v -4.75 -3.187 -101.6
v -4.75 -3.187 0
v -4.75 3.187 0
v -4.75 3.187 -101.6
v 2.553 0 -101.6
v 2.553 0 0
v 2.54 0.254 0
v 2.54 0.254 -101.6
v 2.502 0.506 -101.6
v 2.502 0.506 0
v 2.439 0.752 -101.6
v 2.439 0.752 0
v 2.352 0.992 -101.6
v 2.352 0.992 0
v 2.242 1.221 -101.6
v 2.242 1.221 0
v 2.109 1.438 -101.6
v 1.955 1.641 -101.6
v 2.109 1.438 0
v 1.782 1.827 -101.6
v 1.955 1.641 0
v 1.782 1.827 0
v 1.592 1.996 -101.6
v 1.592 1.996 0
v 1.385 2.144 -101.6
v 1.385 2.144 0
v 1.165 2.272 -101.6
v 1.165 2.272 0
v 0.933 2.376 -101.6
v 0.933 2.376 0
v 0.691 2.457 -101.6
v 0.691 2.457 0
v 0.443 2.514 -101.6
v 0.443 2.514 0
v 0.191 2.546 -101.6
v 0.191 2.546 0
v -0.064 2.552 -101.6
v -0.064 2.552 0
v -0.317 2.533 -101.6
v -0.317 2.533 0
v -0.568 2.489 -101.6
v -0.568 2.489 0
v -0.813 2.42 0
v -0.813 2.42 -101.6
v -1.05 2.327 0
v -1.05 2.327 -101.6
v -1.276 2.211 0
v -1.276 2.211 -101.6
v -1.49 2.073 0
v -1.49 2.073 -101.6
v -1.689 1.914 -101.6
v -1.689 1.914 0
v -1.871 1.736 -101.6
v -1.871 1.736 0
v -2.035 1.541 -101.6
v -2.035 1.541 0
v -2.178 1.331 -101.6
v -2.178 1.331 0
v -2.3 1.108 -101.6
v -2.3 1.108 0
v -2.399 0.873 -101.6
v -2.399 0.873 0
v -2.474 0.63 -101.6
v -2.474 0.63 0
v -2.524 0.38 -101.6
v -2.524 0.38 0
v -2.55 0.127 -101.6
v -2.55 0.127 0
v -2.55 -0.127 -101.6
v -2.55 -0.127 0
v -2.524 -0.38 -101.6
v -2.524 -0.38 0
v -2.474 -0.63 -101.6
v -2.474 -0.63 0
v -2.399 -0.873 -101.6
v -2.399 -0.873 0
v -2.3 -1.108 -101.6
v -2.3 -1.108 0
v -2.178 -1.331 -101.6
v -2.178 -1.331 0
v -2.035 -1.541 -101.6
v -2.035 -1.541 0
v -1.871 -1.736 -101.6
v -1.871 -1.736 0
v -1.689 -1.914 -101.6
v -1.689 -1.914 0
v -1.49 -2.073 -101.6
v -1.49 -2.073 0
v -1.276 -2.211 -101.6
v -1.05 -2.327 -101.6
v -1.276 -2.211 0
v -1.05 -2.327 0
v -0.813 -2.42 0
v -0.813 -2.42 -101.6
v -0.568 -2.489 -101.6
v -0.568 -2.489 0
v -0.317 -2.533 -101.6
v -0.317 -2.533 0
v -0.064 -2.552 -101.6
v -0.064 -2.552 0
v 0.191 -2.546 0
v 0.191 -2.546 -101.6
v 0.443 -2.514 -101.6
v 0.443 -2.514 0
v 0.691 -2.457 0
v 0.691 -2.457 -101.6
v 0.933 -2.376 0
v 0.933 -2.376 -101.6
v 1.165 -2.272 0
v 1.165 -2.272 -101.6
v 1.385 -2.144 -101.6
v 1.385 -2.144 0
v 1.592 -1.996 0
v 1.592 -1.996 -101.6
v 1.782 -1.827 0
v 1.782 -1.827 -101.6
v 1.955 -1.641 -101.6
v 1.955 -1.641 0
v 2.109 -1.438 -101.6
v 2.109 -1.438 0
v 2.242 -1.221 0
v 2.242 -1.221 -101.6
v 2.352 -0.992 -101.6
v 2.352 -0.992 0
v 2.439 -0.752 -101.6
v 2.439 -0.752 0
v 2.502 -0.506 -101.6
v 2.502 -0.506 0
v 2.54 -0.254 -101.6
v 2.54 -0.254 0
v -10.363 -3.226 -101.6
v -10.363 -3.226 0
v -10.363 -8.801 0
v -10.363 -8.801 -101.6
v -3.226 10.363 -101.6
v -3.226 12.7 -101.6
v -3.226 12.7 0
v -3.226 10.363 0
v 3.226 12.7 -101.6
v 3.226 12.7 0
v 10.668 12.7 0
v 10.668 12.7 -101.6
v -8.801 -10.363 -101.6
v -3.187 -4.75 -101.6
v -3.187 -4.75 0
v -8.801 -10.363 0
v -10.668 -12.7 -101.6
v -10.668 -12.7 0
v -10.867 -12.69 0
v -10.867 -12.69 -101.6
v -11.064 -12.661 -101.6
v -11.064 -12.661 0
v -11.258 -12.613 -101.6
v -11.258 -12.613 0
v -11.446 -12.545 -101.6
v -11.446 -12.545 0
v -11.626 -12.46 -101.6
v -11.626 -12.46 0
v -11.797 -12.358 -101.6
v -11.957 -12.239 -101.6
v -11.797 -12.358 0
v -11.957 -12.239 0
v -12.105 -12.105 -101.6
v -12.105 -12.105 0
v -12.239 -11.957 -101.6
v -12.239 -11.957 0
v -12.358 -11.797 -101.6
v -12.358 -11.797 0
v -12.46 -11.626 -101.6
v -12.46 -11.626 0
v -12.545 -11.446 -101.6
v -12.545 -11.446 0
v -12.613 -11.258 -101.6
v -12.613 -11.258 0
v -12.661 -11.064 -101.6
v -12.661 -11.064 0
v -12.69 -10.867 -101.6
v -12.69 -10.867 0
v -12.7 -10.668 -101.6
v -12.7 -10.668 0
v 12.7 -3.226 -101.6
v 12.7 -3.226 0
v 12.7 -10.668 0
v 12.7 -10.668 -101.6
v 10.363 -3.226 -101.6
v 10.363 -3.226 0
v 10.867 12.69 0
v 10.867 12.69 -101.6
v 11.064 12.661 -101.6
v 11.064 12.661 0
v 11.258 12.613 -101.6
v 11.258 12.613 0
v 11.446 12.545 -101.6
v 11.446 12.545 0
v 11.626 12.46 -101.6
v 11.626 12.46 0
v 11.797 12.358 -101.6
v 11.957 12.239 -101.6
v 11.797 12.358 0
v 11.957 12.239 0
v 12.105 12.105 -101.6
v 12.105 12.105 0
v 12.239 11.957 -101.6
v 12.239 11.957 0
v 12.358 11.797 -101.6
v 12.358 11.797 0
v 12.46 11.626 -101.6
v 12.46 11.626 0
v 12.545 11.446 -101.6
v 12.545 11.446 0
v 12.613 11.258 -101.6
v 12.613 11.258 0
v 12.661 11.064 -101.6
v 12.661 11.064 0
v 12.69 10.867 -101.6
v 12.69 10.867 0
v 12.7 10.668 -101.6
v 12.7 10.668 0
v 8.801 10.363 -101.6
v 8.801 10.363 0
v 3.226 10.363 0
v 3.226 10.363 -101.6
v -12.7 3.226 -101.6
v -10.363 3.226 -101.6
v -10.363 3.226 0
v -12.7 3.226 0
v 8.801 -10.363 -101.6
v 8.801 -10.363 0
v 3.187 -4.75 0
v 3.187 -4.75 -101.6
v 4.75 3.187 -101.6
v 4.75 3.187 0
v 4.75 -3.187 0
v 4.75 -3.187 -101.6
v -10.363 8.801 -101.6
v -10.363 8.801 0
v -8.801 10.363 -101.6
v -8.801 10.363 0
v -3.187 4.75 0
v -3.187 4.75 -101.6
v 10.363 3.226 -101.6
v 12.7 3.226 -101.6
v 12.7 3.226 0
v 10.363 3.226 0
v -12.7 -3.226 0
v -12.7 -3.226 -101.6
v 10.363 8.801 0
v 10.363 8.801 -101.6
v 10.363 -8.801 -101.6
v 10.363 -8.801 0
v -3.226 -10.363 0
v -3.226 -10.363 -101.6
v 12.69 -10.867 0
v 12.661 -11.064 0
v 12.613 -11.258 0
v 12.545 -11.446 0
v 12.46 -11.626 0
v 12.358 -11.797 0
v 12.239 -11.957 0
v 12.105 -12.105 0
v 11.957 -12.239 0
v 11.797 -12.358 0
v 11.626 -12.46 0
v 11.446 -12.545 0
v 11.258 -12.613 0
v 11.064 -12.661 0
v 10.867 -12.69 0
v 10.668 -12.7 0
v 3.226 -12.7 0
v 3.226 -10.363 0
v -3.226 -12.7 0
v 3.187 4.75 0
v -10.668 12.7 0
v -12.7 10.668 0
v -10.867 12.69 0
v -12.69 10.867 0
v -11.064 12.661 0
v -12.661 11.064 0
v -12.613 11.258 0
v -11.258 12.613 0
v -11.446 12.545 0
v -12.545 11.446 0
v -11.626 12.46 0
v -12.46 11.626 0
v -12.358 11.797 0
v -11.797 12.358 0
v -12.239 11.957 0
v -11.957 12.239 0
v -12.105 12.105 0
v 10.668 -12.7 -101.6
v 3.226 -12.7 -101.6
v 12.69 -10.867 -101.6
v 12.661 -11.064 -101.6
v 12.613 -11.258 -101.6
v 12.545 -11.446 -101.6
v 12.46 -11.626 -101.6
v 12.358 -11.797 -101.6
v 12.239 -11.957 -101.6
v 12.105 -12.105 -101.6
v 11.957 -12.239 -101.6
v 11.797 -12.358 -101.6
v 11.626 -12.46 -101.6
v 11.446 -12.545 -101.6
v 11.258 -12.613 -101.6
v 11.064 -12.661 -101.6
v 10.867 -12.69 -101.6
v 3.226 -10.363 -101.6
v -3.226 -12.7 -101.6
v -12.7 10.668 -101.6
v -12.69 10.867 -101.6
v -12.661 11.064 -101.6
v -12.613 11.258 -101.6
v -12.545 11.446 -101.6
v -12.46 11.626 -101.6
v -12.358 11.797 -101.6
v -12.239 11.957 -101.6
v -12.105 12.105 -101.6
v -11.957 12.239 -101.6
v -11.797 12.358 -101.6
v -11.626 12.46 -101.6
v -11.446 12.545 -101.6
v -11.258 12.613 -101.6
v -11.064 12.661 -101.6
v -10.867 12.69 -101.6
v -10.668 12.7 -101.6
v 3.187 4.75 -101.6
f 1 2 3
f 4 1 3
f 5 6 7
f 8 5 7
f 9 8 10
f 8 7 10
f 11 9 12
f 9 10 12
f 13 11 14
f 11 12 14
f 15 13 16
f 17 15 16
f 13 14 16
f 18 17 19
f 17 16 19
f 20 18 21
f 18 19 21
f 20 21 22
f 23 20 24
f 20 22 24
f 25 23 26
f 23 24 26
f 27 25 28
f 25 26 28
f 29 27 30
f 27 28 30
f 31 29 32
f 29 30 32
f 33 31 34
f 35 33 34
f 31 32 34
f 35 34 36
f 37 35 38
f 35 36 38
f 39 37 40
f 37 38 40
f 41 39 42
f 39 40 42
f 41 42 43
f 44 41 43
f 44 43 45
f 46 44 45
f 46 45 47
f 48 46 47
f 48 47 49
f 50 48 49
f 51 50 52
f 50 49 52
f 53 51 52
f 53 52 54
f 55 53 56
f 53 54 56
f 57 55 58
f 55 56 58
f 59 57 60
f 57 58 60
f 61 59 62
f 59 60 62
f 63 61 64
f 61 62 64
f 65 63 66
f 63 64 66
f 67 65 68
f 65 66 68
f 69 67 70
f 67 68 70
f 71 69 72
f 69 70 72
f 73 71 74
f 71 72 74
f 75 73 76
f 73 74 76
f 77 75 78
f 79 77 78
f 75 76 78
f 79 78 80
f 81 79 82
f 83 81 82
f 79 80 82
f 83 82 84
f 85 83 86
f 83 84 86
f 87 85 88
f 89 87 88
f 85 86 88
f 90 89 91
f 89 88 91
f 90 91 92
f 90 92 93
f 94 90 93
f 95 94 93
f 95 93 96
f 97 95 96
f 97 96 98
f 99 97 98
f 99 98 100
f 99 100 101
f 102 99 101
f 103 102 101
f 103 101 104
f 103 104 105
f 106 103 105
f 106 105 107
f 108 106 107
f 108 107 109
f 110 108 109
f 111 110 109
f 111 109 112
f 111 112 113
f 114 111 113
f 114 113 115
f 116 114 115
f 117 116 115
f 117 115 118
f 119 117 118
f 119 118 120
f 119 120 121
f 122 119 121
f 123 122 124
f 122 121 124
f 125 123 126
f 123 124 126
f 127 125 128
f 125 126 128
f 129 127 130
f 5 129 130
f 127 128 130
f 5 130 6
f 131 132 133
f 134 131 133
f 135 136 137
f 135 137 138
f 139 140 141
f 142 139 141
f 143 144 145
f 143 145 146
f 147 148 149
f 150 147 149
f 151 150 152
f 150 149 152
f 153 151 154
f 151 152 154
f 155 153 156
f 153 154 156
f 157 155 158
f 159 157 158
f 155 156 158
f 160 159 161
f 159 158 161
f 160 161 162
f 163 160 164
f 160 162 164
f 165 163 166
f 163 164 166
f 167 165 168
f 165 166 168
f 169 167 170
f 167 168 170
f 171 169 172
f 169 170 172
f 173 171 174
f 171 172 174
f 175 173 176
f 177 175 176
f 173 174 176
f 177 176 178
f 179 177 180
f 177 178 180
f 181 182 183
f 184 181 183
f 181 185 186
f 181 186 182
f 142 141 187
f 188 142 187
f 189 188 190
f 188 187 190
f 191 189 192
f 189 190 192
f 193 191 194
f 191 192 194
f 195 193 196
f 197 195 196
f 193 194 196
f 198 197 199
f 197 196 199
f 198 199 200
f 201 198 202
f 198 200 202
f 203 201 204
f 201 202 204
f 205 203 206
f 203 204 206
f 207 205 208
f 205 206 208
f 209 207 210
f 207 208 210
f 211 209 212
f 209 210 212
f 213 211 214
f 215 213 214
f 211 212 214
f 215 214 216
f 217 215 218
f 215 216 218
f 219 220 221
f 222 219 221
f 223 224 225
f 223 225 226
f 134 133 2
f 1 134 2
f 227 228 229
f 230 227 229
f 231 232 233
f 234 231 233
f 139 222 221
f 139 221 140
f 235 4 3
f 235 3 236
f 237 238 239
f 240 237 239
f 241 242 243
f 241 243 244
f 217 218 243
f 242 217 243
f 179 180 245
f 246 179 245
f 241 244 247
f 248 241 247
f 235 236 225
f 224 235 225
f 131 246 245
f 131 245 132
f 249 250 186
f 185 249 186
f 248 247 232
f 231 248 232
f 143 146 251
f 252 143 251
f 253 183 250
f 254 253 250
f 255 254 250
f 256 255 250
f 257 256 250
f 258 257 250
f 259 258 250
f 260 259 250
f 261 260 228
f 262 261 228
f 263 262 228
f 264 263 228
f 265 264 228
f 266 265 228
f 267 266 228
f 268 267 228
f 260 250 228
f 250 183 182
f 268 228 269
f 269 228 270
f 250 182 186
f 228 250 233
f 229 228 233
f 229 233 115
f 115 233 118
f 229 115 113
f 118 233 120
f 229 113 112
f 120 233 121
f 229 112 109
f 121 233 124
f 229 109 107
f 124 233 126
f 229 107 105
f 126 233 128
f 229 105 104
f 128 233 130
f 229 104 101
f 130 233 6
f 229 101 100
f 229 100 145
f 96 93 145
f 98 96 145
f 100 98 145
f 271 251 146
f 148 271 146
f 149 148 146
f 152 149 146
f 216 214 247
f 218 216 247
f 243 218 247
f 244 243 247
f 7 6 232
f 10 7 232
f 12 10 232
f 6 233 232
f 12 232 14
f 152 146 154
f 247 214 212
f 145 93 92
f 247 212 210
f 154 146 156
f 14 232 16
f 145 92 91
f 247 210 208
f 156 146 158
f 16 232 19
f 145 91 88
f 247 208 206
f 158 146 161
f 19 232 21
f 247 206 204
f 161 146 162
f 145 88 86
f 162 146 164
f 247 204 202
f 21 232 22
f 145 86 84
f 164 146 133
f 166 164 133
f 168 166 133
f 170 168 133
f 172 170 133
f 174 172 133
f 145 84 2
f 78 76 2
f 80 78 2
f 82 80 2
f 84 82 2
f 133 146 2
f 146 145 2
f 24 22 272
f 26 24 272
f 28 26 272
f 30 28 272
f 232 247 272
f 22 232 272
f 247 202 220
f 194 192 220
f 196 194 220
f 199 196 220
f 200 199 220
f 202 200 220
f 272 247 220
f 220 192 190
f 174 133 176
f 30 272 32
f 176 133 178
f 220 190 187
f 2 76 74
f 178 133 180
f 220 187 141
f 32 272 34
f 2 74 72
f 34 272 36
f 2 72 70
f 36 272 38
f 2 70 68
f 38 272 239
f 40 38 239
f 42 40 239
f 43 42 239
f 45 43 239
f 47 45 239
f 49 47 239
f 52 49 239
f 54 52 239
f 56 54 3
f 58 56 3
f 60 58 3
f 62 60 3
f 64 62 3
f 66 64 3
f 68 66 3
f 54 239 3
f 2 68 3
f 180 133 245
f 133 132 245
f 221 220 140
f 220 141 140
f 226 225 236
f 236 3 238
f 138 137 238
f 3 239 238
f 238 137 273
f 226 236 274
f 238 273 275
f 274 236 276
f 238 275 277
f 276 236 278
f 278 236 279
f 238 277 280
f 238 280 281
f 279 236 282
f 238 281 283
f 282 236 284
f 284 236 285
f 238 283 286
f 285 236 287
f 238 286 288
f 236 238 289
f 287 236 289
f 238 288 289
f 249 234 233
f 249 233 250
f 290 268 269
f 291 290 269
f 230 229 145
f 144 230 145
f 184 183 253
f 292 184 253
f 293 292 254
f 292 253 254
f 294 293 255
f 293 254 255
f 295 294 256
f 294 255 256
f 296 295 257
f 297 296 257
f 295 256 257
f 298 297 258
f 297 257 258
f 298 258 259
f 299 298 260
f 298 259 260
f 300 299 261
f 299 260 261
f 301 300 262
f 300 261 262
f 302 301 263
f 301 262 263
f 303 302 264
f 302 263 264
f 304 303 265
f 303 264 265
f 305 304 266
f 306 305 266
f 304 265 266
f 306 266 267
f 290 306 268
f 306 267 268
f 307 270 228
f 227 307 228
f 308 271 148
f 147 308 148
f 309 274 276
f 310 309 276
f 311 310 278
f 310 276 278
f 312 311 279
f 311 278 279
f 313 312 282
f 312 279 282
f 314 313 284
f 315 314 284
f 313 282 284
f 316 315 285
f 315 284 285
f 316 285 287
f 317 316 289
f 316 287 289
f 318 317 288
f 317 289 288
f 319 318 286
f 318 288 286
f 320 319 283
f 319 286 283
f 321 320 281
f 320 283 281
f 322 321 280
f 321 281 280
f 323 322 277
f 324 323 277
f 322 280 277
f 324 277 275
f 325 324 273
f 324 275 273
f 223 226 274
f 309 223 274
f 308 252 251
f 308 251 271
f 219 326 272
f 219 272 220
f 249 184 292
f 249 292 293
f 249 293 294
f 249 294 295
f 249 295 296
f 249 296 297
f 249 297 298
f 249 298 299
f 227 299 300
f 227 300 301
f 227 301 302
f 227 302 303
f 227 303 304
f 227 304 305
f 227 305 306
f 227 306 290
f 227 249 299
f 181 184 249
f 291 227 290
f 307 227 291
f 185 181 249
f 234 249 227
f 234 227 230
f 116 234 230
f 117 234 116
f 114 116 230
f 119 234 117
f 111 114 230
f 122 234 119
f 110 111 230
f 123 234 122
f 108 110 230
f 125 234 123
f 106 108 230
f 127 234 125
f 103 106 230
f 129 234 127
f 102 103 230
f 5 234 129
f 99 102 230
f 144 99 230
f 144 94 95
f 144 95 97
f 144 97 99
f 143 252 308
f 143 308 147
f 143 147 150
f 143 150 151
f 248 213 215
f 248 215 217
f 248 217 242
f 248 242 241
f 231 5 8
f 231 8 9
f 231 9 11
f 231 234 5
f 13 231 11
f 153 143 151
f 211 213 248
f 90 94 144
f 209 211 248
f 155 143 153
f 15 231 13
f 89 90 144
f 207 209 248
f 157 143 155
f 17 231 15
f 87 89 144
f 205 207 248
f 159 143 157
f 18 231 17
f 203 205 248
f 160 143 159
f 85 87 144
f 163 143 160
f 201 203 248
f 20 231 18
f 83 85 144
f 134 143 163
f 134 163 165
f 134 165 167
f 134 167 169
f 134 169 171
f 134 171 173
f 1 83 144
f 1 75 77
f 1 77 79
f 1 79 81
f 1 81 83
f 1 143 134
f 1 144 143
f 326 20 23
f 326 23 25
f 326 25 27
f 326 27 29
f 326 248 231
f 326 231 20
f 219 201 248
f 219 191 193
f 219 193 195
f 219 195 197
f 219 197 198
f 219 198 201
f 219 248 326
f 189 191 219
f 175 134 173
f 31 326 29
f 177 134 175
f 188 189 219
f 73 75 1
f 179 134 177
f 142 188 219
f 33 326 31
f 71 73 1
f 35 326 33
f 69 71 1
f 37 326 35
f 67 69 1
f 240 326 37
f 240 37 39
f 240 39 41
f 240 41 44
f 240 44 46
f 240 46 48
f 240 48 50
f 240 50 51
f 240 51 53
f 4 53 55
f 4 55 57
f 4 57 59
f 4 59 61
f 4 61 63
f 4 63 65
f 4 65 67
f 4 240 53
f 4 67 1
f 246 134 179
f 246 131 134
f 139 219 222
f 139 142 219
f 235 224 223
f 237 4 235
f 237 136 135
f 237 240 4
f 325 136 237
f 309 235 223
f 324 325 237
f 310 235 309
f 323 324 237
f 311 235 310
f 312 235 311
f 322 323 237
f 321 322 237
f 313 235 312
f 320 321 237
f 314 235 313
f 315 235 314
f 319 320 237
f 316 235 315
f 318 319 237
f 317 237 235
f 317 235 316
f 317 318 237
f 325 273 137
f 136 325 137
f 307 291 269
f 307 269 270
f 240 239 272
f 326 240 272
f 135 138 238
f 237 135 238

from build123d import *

# Parameters (mm, degrees)
SKETCH1_R      = 2.5527
FINALCUT_DEPTH = 101.6


with BuildPart() as part:
    # Sketch1 → FinalCut (new body)
    with BuildSketch(Plane.XY):
        with BuildLine():
            Line((-4.7498, 0), (-4.7498, 3.187235435))
            Line((-4.7498, 3.187235435), (-10.3632, 8.800635435))
            Line((-10.3632, 8.800635435), (-10.3632, 3.2258))
            Line((-10.3632, 3.2258), (-12.7, 3.2258))
            Line((-12.7, 3.2258), (-12.7, 10.668))
            ThreePointArc((-12.7, 10.668), (-12.104840979, 12.104840979), (-10.668, 12.7))
            Line((-10.668, 12.7), (-3.2258, 12.7))
            Line((-3.2258, 12.7), (-3.2258, 10.3632))
            Line((-3.2258, 10.3632), (-8.800635435, 10.3632))
            Line((-8.800635435, 10.3632), (-3.187235435, 4.7498))
            Line((-3.187235435, 4.7498), (0, 4.7498))
            Line((0, 4.7498), (3.187235435, 4.7498))
            Line((3.187235435, 4.7498), (8.800635435, 10.3632))
            Line((8.800635435, 10.3632), (3.2258, 10.3632))
            Line((3.2258, 10.3632), (3.2258, 12.7))
            Line((3.2258, 12.7), (10.668, 12.7))
            ThreePointArc((10.668, 12.7), (12.104840979, 12.104840979), (12.7, 10.668))
            Line((12.7, 10.668), (12.7, 3.2258))
            Line((12.7, 3.2258), (10.3632, 3.2258))
            Line((10.3632, 3.2258), (10.3632, 8.800635435))
            Line((10.3632, 8.800635435), (4.7498, 3.187235435))
            Line((4.7498, 3.187235435), (4.7498, 0))
            Line((4.7498, 0), (4.7498, -3.187235435))
            Line((4.7498, -3.187235435), (10.3632, -8.800635435))
            Line((10.3632, -8.800635435), (10.3632, -3.2258))
            Line((10.3632, -3.2258), (12.7, -3.2258))
            Line((12.7, -3.2258), (12.7, -10.668))
            ThreePointArc((12.7, -10.668), (12.104840979, -12.104840979), (10.668, -12.7))
            Line((10.668, -12.7), (3.2258, -12.7))
            Line((3.2258, -12.7), (3.2258, -10.3632))
            Line((3.2258, -10.3632), (8.800635435, -10.3632))
            Line((8.800635435, -10.3632), (3.187235435, -4.7498))
            Line((3.187235435, -4.7498), (0, -4.7498))
            Line((0, -4.7498), (-3.187235435, -4.7498))
            Line((-3.187235435, -4.7498), (-8.800635435, -10.3632))
            Line((-8.800635435, -10.3632), (-3.2258, -10.3632))
            Line((-3.2258, -10.3632), (-3.2258, -12.7))
            Line((-3.2258, -12.7), (-10.668, -12.7))
            ThreePointArc((-10.668, -12.7), (-12.104840979, -12.104840979), (-12.7, -10.668))
            Line((-12.7, -10.668), (-12.7, -3.2258))
            Line((-12.7, -3.2258), (-10.3632, -3.2258))
            Line((-10.3632, -3.2258), (-10.3632, -8.800635435))
            Line((-10.3632, -8.800635435), (-4.7498, -3.187235435))
            Line((-4.7498, -3.187235435), (-4.7498, 0))
        make_face()
        Circle(SKETCH1_R, mode=Mode.SUBTRACT)
    extrude(amount=-FINALCUT_DEPTH)


solid = part.part
